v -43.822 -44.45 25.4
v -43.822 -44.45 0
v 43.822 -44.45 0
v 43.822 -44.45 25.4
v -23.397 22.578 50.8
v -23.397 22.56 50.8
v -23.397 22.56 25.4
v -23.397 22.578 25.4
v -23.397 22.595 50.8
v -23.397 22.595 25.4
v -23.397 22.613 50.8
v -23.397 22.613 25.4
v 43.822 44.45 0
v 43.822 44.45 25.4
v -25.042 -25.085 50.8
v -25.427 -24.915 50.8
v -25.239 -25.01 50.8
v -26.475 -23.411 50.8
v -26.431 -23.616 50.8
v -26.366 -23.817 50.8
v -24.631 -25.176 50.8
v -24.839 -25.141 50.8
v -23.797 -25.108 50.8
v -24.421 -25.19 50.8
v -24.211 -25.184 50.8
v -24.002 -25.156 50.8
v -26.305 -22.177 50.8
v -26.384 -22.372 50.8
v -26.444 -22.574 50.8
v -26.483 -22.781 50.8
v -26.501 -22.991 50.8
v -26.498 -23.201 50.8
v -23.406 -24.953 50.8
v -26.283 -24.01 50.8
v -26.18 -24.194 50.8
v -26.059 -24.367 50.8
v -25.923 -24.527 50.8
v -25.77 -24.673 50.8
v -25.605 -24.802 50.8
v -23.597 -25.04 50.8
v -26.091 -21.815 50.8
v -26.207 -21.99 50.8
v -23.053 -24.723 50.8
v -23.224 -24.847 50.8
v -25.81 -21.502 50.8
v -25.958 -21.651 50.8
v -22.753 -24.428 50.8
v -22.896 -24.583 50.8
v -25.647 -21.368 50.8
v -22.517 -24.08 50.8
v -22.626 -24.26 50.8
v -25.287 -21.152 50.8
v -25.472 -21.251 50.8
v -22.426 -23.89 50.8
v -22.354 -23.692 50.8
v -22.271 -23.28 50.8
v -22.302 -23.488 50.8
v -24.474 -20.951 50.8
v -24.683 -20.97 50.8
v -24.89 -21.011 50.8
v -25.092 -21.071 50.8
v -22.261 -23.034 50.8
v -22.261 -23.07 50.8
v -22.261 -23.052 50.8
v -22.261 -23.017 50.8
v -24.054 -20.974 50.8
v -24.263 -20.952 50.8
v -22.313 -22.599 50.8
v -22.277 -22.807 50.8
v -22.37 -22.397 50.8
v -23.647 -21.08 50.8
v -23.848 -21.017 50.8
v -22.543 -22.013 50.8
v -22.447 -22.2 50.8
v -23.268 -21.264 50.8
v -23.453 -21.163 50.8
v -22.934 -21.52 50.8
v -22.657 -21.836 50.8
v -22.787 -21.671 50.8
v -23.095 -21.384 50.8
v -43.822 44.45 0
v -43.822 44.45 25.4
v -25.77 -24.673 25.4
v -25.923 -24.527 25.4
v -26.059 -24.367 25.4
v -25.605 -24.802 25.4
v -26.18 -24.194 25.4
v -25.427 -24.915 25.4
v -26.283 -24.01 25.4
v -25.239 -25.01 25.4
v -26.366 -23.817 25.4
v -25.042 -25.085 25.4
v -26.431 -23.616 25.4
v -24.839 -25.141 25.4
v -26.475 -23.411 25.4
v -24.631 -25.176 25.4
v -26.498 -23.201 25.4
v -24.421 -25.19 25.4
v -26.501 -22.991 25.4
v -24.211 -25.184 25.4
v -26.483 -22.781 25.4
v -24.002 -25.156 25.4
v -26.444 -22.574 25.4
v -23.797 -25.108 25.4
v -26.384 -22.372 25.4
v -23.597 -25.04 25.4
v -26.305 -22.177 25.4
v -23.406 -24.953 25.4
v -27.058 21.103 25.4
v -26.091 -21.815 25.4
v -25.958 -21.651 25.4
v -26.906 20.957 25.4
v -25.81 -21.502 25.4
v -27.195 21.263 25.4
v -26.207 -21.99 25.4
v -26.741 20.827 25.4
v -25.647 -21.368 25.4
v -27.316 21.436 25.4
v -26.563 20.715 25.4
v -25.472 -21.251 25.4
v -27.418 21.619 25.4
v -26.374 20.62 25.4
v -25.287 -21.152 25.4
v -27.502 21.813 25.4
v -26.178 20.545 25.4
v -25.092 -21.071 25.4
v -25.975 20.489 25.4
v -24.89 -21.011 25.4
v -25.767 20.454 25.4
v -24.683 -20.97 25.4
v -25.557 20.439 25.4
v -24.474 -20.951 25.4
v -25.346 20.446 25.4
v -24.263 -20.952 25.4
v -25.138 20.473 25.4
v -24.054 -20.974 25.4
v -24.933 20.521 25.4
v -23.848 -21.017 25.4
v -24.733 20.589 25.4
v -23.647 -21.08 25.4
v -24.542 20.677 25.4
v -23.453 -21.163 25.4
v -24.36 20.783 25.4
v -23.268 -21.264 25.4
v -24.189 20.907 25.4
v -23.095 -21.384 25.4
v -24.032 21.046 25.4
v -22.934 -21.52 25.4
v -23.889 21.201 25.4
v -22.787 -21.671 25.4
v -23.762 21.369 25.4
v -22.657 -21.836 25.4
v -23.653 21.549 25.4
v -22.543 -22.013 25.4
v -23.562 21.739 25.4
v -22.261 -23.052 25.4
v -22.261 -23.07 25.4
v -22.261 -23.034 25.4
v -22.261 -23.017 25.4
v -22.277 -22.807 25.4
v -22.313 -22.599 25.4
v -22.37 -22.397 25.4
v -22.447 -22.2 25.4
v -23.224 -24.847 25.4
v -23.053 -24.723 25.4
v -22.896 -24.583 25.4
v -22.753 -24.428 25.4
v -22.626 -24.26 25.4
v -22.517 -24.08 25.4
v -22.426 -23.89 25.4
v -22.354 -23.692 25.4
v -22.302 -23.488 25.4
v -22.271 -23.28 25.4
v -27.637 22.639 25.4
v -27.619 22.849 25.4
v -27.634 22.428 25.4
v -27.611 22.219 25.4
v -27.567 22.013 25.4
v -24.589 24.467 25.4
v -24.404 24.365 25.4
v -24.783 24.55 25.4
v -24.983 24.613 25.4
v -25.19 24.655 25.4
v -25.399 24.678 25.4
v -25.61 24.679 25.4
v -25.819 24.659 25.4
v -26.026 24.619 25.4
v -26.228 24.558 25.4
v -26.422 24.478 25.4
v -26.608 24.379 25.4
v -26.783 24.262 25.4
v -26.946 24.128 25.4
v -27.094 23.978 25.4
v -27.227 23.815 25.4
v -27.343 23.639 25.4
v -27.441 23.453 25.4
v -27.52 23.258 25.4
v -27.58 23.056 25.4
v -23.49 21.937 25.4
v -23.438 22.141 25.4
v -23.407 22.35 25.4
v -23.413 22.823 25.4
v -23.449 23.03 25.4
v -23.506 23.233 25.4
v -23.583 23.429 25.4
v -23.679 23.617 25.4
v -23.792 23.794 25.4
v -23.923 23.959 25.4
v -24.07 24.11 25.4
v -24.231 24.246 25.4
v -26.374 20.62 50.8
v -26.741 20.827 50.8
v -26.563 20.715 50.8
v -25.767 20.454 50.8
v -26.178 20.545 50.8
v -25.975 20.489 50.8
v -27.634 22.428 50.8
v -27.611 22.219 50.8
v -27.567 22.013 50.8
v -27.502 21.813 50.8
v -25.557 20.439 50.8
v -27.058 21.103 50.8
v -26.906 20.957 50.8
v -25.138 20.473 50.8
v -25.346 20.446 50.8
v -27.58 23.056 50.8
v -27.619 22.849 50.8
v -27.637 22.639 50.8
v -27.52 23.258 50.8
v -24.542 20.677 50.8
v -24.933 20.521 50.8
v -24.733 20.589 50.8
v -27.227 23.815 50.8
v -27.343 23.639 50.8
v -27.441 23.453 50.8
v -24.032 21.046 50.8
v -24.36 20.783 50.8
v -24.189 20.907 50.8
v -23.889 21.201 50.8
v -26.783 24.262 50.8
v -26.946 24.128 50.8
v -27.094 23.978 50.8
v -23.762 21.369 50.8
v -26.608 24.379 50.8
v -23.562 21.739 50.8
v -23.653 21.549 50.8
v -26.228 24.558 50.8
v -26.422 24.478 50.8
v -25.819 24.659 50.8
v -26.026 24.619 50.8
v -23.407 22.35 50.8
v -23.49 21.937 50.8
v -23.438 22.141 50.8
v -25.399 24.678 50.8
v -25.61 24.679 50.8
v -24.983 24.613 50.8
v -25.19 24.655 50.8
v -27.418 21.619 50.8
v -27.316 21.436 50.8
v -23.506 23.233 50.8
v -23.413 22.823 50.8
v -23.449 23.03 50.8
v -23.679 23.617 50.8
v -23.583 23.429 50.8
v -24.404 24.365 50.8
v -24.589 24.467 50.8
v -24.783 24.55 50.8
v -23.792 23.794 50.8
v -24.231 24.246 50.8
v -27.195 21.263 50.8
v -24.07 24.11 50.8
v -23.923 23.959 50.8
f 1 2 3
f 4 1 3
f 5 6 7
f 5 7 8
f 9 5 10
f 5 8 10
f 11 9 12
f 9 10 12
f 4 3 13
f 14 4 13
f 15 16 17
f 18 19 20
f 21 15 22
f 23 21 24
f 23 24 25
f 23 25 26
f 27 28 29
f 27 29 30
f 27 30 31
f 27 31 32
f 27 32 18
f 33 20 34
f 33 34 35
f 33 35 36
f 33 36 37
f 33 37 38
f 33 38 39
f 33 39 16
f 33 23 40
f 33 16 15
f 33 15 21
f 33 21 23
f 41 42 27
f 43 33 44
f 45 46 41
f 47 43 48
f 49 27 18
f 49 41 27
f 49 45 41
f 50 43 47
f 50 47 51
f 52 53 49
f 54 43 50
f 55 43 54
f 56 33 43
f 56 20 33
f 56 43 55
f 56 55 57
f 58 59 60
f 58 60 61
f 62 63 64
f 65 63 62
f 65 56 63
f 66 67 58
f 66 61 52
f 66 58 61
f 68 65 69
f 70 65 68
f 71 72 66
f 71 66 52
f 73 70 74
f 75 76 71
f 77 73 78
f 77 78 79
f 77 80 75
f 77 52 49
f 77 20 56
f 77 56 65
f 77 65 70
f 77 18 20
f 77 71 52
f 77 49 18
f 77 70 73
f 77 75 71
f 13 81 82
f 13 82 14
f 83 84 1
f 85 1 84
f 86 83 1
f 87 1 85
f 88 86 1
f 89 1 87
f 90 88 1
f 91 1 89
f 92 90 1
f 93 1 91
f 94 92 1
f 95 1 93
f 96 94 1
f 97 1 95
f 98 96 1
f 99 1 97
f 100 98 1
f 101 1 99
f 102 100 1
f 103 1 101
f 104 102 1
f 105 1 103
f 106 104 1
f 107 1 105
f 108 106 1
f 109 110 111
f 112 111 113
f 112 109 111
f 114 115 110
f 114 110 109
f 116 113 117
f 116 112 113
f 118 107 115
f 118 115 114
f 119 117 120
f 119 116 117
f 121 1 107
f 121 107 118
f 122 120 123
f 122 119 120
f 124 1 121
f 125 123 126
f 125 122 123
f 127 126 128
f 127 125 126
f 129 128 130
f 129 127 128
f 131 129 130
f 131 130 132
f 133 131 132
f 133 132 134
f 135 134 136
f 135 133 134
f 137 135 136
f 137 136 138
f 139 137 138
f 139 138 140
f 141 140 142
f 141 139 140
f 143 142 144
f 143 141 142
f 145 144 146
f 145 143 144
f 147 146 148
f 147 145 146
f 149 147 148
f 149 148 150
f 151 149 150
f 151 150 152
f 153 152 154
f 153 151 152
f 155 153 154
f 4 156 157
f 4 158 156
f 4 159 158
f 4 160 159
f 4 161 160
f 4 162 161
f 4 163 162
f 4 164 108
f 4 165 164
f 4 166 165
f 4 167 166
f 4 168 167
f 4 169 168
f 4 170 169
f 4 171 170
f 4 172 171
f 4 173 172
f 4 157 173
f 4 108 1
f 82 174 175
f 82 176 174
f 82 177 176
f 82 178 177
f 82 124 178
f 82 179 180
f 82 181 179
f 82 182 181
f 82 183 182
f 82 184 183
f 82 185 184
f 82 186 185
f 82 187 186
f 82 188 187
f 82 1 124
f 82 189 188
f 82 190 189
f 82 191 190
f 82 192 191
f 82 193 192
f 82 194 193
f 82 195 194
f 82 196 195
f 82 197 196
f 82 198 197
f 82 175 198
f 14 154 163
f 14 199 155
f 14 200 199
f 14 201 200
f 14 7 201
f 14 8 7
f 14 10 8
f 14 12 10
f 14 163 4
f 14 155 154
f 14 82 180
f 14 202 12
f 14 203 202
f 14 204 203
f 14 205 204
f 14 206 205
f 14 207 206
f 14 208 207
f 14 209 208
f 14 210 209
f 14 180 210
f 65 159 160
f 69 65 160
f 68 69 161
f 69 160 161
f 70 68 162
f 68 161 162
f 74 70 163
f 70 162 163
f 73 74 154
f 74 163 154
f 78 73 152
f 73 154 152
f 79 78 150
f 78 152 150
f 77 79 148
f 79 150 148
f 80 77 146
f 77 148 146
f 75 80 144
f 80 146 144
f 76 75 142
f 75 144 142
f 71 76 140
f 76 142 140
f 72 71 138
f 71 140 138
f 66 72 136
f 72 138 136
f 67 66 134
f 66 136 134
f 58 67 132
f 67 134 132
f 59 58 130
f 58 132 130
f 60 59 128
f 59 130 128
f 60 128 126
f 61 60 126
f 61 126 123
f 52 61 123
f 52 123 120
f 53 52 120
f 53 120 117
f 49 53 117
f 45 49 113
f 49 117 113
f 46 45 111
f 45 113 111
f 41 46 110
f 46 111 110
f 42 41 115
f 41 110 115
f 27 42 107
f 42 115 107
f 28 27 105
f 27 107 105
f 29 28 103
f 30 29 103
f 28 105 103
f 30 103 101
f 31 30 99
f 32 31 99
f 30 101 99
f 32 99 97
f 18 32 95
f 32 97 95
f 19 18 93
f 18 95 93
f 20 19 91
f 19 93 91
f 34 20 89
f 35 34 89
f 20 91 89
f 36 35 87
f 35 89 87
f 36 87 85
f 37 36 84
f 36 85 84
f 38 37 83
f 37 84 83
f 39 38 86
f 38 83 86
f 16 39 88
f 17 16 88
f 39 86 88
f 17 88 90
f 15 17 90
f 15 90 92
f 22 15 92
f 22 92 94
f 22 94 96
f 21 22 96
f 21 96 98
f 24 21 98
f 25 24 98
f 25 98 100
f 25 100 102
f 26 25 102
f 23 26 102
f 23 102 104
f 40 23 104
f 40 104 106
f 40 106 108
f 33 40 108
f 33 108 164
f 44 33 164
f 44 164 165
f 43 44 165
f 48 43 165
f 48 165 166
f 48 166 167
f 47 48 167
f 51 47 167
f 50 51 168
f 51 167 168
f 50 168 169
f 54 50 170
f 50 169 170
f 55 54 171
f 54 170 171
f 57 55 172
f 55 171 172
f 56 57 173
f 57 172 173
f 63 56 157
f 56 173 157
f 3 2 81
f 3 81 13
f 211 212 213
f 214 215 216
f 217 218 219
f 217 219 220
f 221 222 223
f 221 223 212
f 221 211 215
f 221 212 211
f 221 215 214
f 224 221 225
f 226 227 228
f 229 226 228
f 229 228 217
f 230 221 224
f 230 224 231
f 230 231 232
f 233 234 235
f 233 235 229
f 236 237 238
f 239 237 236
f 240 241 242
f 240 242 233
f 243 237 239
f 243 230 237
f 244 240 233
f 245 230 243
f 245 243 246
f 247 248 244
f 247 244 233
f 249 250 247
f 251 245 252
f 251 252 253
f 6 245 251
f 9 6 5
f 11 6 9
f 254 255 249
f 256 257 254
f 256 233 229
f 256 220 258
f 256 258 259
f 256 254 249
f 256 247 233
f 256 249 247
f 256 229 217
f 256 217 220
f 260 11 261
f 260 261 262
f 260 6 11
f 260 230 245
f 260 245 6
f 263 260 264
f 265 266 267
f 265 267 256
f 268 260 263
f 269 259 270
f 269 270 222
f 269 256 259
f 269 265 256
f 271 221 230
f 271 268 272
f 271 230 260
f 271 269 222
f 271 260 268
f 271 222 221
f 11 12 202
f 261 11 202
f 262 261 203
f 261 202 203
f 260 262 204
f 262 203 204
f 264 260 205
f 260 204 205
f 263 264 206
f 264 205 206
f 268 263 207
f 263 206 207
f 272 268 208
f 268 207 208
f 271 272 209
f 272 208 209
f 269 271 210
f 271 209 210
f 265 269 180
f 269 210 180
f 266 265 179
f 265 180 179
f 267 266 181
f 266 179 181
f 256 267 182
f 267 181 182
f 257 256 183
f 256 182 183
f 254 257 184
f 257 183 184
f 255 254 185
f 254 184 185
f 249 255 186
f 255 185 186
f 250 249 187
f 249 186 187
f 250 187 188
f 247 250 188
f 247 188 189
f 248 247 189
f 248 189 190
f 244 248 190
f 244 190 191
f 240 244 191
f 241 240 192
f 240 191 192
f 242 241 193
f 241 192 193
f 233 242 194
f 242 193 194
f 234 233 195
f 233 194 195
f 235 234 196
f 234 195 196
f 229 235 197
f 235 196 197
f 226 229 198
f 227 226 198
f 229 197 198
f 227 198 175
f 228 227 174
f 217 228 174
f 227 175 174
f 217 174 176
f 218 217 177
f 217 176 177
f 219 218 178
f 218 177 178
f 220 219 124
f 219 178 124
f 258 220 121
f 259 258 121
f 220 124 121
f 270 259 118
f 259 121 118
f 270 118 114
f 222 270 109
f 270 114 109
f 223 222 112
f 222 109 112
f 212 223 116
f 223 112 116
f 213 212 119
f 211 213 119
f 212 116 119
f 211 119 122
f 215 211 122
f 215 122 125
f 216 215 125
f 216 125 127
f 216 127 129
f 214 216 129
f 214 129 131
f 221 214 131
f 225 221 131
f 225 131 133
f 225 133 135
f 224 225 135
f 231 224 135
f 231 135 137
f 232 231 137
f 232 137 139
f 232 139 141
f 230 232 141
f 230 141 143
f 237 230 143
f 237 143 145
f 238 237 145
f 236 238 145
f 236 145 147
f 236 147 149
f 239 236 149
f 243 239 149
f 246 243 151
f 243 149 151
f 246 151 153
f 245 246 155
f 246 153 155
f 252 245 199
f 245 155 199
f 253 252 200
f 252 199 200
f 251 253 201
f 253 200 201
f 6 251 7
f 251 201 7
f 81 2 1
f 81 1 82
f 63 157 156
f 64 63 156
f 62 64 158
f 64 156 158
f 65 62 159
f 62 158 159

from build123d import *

# Parameters (mm, degrees)
F0_W     = 87.64372
F0_H     = 88.9
F1_DEPTH = 25.4
F3_DEPTH = 25.4
F4_DEPTH = 25.4


with BuildPart() as f1:
    # F0 (on Top) → F1 (new body)
    with BuildSketch(Plane.XY):
        Rectangle(F0_W, F0_H)
    extrude(amount=F1_DEPTH)

    # F2 (on face) → F3 (join)
    with BuildSketch(Plane.XY.offset(25.4)):
        with BuildLine():
            ThreePointArc((-23.397237, 22.612818), (-27.638216, 22.533643), (-23.39658, 22.560036))
            ThreePointArc((-23.39658, 22.560036), (-23.396744, 22.586429), (-23.397237, 22.612818))
        make_face()
    extrude(amount=F3_DEPTH)

    # F2 (on face) → F4 (join)
    with BuildSketch(Plane.XY.offset(25.4)):
        with BuildLine():
            ThreePointArc((-22.260667, -23.069627), (-22.260831, -23.043234), (-22.261324, -23.016845))
            ThreePointArc((-22.261324, -23.016845), (-26.502303, -23.09602), (-22.260667, -23.069627))
        make_face()
    extrude(amount=F4_DEPTH)


solid = f1.part
